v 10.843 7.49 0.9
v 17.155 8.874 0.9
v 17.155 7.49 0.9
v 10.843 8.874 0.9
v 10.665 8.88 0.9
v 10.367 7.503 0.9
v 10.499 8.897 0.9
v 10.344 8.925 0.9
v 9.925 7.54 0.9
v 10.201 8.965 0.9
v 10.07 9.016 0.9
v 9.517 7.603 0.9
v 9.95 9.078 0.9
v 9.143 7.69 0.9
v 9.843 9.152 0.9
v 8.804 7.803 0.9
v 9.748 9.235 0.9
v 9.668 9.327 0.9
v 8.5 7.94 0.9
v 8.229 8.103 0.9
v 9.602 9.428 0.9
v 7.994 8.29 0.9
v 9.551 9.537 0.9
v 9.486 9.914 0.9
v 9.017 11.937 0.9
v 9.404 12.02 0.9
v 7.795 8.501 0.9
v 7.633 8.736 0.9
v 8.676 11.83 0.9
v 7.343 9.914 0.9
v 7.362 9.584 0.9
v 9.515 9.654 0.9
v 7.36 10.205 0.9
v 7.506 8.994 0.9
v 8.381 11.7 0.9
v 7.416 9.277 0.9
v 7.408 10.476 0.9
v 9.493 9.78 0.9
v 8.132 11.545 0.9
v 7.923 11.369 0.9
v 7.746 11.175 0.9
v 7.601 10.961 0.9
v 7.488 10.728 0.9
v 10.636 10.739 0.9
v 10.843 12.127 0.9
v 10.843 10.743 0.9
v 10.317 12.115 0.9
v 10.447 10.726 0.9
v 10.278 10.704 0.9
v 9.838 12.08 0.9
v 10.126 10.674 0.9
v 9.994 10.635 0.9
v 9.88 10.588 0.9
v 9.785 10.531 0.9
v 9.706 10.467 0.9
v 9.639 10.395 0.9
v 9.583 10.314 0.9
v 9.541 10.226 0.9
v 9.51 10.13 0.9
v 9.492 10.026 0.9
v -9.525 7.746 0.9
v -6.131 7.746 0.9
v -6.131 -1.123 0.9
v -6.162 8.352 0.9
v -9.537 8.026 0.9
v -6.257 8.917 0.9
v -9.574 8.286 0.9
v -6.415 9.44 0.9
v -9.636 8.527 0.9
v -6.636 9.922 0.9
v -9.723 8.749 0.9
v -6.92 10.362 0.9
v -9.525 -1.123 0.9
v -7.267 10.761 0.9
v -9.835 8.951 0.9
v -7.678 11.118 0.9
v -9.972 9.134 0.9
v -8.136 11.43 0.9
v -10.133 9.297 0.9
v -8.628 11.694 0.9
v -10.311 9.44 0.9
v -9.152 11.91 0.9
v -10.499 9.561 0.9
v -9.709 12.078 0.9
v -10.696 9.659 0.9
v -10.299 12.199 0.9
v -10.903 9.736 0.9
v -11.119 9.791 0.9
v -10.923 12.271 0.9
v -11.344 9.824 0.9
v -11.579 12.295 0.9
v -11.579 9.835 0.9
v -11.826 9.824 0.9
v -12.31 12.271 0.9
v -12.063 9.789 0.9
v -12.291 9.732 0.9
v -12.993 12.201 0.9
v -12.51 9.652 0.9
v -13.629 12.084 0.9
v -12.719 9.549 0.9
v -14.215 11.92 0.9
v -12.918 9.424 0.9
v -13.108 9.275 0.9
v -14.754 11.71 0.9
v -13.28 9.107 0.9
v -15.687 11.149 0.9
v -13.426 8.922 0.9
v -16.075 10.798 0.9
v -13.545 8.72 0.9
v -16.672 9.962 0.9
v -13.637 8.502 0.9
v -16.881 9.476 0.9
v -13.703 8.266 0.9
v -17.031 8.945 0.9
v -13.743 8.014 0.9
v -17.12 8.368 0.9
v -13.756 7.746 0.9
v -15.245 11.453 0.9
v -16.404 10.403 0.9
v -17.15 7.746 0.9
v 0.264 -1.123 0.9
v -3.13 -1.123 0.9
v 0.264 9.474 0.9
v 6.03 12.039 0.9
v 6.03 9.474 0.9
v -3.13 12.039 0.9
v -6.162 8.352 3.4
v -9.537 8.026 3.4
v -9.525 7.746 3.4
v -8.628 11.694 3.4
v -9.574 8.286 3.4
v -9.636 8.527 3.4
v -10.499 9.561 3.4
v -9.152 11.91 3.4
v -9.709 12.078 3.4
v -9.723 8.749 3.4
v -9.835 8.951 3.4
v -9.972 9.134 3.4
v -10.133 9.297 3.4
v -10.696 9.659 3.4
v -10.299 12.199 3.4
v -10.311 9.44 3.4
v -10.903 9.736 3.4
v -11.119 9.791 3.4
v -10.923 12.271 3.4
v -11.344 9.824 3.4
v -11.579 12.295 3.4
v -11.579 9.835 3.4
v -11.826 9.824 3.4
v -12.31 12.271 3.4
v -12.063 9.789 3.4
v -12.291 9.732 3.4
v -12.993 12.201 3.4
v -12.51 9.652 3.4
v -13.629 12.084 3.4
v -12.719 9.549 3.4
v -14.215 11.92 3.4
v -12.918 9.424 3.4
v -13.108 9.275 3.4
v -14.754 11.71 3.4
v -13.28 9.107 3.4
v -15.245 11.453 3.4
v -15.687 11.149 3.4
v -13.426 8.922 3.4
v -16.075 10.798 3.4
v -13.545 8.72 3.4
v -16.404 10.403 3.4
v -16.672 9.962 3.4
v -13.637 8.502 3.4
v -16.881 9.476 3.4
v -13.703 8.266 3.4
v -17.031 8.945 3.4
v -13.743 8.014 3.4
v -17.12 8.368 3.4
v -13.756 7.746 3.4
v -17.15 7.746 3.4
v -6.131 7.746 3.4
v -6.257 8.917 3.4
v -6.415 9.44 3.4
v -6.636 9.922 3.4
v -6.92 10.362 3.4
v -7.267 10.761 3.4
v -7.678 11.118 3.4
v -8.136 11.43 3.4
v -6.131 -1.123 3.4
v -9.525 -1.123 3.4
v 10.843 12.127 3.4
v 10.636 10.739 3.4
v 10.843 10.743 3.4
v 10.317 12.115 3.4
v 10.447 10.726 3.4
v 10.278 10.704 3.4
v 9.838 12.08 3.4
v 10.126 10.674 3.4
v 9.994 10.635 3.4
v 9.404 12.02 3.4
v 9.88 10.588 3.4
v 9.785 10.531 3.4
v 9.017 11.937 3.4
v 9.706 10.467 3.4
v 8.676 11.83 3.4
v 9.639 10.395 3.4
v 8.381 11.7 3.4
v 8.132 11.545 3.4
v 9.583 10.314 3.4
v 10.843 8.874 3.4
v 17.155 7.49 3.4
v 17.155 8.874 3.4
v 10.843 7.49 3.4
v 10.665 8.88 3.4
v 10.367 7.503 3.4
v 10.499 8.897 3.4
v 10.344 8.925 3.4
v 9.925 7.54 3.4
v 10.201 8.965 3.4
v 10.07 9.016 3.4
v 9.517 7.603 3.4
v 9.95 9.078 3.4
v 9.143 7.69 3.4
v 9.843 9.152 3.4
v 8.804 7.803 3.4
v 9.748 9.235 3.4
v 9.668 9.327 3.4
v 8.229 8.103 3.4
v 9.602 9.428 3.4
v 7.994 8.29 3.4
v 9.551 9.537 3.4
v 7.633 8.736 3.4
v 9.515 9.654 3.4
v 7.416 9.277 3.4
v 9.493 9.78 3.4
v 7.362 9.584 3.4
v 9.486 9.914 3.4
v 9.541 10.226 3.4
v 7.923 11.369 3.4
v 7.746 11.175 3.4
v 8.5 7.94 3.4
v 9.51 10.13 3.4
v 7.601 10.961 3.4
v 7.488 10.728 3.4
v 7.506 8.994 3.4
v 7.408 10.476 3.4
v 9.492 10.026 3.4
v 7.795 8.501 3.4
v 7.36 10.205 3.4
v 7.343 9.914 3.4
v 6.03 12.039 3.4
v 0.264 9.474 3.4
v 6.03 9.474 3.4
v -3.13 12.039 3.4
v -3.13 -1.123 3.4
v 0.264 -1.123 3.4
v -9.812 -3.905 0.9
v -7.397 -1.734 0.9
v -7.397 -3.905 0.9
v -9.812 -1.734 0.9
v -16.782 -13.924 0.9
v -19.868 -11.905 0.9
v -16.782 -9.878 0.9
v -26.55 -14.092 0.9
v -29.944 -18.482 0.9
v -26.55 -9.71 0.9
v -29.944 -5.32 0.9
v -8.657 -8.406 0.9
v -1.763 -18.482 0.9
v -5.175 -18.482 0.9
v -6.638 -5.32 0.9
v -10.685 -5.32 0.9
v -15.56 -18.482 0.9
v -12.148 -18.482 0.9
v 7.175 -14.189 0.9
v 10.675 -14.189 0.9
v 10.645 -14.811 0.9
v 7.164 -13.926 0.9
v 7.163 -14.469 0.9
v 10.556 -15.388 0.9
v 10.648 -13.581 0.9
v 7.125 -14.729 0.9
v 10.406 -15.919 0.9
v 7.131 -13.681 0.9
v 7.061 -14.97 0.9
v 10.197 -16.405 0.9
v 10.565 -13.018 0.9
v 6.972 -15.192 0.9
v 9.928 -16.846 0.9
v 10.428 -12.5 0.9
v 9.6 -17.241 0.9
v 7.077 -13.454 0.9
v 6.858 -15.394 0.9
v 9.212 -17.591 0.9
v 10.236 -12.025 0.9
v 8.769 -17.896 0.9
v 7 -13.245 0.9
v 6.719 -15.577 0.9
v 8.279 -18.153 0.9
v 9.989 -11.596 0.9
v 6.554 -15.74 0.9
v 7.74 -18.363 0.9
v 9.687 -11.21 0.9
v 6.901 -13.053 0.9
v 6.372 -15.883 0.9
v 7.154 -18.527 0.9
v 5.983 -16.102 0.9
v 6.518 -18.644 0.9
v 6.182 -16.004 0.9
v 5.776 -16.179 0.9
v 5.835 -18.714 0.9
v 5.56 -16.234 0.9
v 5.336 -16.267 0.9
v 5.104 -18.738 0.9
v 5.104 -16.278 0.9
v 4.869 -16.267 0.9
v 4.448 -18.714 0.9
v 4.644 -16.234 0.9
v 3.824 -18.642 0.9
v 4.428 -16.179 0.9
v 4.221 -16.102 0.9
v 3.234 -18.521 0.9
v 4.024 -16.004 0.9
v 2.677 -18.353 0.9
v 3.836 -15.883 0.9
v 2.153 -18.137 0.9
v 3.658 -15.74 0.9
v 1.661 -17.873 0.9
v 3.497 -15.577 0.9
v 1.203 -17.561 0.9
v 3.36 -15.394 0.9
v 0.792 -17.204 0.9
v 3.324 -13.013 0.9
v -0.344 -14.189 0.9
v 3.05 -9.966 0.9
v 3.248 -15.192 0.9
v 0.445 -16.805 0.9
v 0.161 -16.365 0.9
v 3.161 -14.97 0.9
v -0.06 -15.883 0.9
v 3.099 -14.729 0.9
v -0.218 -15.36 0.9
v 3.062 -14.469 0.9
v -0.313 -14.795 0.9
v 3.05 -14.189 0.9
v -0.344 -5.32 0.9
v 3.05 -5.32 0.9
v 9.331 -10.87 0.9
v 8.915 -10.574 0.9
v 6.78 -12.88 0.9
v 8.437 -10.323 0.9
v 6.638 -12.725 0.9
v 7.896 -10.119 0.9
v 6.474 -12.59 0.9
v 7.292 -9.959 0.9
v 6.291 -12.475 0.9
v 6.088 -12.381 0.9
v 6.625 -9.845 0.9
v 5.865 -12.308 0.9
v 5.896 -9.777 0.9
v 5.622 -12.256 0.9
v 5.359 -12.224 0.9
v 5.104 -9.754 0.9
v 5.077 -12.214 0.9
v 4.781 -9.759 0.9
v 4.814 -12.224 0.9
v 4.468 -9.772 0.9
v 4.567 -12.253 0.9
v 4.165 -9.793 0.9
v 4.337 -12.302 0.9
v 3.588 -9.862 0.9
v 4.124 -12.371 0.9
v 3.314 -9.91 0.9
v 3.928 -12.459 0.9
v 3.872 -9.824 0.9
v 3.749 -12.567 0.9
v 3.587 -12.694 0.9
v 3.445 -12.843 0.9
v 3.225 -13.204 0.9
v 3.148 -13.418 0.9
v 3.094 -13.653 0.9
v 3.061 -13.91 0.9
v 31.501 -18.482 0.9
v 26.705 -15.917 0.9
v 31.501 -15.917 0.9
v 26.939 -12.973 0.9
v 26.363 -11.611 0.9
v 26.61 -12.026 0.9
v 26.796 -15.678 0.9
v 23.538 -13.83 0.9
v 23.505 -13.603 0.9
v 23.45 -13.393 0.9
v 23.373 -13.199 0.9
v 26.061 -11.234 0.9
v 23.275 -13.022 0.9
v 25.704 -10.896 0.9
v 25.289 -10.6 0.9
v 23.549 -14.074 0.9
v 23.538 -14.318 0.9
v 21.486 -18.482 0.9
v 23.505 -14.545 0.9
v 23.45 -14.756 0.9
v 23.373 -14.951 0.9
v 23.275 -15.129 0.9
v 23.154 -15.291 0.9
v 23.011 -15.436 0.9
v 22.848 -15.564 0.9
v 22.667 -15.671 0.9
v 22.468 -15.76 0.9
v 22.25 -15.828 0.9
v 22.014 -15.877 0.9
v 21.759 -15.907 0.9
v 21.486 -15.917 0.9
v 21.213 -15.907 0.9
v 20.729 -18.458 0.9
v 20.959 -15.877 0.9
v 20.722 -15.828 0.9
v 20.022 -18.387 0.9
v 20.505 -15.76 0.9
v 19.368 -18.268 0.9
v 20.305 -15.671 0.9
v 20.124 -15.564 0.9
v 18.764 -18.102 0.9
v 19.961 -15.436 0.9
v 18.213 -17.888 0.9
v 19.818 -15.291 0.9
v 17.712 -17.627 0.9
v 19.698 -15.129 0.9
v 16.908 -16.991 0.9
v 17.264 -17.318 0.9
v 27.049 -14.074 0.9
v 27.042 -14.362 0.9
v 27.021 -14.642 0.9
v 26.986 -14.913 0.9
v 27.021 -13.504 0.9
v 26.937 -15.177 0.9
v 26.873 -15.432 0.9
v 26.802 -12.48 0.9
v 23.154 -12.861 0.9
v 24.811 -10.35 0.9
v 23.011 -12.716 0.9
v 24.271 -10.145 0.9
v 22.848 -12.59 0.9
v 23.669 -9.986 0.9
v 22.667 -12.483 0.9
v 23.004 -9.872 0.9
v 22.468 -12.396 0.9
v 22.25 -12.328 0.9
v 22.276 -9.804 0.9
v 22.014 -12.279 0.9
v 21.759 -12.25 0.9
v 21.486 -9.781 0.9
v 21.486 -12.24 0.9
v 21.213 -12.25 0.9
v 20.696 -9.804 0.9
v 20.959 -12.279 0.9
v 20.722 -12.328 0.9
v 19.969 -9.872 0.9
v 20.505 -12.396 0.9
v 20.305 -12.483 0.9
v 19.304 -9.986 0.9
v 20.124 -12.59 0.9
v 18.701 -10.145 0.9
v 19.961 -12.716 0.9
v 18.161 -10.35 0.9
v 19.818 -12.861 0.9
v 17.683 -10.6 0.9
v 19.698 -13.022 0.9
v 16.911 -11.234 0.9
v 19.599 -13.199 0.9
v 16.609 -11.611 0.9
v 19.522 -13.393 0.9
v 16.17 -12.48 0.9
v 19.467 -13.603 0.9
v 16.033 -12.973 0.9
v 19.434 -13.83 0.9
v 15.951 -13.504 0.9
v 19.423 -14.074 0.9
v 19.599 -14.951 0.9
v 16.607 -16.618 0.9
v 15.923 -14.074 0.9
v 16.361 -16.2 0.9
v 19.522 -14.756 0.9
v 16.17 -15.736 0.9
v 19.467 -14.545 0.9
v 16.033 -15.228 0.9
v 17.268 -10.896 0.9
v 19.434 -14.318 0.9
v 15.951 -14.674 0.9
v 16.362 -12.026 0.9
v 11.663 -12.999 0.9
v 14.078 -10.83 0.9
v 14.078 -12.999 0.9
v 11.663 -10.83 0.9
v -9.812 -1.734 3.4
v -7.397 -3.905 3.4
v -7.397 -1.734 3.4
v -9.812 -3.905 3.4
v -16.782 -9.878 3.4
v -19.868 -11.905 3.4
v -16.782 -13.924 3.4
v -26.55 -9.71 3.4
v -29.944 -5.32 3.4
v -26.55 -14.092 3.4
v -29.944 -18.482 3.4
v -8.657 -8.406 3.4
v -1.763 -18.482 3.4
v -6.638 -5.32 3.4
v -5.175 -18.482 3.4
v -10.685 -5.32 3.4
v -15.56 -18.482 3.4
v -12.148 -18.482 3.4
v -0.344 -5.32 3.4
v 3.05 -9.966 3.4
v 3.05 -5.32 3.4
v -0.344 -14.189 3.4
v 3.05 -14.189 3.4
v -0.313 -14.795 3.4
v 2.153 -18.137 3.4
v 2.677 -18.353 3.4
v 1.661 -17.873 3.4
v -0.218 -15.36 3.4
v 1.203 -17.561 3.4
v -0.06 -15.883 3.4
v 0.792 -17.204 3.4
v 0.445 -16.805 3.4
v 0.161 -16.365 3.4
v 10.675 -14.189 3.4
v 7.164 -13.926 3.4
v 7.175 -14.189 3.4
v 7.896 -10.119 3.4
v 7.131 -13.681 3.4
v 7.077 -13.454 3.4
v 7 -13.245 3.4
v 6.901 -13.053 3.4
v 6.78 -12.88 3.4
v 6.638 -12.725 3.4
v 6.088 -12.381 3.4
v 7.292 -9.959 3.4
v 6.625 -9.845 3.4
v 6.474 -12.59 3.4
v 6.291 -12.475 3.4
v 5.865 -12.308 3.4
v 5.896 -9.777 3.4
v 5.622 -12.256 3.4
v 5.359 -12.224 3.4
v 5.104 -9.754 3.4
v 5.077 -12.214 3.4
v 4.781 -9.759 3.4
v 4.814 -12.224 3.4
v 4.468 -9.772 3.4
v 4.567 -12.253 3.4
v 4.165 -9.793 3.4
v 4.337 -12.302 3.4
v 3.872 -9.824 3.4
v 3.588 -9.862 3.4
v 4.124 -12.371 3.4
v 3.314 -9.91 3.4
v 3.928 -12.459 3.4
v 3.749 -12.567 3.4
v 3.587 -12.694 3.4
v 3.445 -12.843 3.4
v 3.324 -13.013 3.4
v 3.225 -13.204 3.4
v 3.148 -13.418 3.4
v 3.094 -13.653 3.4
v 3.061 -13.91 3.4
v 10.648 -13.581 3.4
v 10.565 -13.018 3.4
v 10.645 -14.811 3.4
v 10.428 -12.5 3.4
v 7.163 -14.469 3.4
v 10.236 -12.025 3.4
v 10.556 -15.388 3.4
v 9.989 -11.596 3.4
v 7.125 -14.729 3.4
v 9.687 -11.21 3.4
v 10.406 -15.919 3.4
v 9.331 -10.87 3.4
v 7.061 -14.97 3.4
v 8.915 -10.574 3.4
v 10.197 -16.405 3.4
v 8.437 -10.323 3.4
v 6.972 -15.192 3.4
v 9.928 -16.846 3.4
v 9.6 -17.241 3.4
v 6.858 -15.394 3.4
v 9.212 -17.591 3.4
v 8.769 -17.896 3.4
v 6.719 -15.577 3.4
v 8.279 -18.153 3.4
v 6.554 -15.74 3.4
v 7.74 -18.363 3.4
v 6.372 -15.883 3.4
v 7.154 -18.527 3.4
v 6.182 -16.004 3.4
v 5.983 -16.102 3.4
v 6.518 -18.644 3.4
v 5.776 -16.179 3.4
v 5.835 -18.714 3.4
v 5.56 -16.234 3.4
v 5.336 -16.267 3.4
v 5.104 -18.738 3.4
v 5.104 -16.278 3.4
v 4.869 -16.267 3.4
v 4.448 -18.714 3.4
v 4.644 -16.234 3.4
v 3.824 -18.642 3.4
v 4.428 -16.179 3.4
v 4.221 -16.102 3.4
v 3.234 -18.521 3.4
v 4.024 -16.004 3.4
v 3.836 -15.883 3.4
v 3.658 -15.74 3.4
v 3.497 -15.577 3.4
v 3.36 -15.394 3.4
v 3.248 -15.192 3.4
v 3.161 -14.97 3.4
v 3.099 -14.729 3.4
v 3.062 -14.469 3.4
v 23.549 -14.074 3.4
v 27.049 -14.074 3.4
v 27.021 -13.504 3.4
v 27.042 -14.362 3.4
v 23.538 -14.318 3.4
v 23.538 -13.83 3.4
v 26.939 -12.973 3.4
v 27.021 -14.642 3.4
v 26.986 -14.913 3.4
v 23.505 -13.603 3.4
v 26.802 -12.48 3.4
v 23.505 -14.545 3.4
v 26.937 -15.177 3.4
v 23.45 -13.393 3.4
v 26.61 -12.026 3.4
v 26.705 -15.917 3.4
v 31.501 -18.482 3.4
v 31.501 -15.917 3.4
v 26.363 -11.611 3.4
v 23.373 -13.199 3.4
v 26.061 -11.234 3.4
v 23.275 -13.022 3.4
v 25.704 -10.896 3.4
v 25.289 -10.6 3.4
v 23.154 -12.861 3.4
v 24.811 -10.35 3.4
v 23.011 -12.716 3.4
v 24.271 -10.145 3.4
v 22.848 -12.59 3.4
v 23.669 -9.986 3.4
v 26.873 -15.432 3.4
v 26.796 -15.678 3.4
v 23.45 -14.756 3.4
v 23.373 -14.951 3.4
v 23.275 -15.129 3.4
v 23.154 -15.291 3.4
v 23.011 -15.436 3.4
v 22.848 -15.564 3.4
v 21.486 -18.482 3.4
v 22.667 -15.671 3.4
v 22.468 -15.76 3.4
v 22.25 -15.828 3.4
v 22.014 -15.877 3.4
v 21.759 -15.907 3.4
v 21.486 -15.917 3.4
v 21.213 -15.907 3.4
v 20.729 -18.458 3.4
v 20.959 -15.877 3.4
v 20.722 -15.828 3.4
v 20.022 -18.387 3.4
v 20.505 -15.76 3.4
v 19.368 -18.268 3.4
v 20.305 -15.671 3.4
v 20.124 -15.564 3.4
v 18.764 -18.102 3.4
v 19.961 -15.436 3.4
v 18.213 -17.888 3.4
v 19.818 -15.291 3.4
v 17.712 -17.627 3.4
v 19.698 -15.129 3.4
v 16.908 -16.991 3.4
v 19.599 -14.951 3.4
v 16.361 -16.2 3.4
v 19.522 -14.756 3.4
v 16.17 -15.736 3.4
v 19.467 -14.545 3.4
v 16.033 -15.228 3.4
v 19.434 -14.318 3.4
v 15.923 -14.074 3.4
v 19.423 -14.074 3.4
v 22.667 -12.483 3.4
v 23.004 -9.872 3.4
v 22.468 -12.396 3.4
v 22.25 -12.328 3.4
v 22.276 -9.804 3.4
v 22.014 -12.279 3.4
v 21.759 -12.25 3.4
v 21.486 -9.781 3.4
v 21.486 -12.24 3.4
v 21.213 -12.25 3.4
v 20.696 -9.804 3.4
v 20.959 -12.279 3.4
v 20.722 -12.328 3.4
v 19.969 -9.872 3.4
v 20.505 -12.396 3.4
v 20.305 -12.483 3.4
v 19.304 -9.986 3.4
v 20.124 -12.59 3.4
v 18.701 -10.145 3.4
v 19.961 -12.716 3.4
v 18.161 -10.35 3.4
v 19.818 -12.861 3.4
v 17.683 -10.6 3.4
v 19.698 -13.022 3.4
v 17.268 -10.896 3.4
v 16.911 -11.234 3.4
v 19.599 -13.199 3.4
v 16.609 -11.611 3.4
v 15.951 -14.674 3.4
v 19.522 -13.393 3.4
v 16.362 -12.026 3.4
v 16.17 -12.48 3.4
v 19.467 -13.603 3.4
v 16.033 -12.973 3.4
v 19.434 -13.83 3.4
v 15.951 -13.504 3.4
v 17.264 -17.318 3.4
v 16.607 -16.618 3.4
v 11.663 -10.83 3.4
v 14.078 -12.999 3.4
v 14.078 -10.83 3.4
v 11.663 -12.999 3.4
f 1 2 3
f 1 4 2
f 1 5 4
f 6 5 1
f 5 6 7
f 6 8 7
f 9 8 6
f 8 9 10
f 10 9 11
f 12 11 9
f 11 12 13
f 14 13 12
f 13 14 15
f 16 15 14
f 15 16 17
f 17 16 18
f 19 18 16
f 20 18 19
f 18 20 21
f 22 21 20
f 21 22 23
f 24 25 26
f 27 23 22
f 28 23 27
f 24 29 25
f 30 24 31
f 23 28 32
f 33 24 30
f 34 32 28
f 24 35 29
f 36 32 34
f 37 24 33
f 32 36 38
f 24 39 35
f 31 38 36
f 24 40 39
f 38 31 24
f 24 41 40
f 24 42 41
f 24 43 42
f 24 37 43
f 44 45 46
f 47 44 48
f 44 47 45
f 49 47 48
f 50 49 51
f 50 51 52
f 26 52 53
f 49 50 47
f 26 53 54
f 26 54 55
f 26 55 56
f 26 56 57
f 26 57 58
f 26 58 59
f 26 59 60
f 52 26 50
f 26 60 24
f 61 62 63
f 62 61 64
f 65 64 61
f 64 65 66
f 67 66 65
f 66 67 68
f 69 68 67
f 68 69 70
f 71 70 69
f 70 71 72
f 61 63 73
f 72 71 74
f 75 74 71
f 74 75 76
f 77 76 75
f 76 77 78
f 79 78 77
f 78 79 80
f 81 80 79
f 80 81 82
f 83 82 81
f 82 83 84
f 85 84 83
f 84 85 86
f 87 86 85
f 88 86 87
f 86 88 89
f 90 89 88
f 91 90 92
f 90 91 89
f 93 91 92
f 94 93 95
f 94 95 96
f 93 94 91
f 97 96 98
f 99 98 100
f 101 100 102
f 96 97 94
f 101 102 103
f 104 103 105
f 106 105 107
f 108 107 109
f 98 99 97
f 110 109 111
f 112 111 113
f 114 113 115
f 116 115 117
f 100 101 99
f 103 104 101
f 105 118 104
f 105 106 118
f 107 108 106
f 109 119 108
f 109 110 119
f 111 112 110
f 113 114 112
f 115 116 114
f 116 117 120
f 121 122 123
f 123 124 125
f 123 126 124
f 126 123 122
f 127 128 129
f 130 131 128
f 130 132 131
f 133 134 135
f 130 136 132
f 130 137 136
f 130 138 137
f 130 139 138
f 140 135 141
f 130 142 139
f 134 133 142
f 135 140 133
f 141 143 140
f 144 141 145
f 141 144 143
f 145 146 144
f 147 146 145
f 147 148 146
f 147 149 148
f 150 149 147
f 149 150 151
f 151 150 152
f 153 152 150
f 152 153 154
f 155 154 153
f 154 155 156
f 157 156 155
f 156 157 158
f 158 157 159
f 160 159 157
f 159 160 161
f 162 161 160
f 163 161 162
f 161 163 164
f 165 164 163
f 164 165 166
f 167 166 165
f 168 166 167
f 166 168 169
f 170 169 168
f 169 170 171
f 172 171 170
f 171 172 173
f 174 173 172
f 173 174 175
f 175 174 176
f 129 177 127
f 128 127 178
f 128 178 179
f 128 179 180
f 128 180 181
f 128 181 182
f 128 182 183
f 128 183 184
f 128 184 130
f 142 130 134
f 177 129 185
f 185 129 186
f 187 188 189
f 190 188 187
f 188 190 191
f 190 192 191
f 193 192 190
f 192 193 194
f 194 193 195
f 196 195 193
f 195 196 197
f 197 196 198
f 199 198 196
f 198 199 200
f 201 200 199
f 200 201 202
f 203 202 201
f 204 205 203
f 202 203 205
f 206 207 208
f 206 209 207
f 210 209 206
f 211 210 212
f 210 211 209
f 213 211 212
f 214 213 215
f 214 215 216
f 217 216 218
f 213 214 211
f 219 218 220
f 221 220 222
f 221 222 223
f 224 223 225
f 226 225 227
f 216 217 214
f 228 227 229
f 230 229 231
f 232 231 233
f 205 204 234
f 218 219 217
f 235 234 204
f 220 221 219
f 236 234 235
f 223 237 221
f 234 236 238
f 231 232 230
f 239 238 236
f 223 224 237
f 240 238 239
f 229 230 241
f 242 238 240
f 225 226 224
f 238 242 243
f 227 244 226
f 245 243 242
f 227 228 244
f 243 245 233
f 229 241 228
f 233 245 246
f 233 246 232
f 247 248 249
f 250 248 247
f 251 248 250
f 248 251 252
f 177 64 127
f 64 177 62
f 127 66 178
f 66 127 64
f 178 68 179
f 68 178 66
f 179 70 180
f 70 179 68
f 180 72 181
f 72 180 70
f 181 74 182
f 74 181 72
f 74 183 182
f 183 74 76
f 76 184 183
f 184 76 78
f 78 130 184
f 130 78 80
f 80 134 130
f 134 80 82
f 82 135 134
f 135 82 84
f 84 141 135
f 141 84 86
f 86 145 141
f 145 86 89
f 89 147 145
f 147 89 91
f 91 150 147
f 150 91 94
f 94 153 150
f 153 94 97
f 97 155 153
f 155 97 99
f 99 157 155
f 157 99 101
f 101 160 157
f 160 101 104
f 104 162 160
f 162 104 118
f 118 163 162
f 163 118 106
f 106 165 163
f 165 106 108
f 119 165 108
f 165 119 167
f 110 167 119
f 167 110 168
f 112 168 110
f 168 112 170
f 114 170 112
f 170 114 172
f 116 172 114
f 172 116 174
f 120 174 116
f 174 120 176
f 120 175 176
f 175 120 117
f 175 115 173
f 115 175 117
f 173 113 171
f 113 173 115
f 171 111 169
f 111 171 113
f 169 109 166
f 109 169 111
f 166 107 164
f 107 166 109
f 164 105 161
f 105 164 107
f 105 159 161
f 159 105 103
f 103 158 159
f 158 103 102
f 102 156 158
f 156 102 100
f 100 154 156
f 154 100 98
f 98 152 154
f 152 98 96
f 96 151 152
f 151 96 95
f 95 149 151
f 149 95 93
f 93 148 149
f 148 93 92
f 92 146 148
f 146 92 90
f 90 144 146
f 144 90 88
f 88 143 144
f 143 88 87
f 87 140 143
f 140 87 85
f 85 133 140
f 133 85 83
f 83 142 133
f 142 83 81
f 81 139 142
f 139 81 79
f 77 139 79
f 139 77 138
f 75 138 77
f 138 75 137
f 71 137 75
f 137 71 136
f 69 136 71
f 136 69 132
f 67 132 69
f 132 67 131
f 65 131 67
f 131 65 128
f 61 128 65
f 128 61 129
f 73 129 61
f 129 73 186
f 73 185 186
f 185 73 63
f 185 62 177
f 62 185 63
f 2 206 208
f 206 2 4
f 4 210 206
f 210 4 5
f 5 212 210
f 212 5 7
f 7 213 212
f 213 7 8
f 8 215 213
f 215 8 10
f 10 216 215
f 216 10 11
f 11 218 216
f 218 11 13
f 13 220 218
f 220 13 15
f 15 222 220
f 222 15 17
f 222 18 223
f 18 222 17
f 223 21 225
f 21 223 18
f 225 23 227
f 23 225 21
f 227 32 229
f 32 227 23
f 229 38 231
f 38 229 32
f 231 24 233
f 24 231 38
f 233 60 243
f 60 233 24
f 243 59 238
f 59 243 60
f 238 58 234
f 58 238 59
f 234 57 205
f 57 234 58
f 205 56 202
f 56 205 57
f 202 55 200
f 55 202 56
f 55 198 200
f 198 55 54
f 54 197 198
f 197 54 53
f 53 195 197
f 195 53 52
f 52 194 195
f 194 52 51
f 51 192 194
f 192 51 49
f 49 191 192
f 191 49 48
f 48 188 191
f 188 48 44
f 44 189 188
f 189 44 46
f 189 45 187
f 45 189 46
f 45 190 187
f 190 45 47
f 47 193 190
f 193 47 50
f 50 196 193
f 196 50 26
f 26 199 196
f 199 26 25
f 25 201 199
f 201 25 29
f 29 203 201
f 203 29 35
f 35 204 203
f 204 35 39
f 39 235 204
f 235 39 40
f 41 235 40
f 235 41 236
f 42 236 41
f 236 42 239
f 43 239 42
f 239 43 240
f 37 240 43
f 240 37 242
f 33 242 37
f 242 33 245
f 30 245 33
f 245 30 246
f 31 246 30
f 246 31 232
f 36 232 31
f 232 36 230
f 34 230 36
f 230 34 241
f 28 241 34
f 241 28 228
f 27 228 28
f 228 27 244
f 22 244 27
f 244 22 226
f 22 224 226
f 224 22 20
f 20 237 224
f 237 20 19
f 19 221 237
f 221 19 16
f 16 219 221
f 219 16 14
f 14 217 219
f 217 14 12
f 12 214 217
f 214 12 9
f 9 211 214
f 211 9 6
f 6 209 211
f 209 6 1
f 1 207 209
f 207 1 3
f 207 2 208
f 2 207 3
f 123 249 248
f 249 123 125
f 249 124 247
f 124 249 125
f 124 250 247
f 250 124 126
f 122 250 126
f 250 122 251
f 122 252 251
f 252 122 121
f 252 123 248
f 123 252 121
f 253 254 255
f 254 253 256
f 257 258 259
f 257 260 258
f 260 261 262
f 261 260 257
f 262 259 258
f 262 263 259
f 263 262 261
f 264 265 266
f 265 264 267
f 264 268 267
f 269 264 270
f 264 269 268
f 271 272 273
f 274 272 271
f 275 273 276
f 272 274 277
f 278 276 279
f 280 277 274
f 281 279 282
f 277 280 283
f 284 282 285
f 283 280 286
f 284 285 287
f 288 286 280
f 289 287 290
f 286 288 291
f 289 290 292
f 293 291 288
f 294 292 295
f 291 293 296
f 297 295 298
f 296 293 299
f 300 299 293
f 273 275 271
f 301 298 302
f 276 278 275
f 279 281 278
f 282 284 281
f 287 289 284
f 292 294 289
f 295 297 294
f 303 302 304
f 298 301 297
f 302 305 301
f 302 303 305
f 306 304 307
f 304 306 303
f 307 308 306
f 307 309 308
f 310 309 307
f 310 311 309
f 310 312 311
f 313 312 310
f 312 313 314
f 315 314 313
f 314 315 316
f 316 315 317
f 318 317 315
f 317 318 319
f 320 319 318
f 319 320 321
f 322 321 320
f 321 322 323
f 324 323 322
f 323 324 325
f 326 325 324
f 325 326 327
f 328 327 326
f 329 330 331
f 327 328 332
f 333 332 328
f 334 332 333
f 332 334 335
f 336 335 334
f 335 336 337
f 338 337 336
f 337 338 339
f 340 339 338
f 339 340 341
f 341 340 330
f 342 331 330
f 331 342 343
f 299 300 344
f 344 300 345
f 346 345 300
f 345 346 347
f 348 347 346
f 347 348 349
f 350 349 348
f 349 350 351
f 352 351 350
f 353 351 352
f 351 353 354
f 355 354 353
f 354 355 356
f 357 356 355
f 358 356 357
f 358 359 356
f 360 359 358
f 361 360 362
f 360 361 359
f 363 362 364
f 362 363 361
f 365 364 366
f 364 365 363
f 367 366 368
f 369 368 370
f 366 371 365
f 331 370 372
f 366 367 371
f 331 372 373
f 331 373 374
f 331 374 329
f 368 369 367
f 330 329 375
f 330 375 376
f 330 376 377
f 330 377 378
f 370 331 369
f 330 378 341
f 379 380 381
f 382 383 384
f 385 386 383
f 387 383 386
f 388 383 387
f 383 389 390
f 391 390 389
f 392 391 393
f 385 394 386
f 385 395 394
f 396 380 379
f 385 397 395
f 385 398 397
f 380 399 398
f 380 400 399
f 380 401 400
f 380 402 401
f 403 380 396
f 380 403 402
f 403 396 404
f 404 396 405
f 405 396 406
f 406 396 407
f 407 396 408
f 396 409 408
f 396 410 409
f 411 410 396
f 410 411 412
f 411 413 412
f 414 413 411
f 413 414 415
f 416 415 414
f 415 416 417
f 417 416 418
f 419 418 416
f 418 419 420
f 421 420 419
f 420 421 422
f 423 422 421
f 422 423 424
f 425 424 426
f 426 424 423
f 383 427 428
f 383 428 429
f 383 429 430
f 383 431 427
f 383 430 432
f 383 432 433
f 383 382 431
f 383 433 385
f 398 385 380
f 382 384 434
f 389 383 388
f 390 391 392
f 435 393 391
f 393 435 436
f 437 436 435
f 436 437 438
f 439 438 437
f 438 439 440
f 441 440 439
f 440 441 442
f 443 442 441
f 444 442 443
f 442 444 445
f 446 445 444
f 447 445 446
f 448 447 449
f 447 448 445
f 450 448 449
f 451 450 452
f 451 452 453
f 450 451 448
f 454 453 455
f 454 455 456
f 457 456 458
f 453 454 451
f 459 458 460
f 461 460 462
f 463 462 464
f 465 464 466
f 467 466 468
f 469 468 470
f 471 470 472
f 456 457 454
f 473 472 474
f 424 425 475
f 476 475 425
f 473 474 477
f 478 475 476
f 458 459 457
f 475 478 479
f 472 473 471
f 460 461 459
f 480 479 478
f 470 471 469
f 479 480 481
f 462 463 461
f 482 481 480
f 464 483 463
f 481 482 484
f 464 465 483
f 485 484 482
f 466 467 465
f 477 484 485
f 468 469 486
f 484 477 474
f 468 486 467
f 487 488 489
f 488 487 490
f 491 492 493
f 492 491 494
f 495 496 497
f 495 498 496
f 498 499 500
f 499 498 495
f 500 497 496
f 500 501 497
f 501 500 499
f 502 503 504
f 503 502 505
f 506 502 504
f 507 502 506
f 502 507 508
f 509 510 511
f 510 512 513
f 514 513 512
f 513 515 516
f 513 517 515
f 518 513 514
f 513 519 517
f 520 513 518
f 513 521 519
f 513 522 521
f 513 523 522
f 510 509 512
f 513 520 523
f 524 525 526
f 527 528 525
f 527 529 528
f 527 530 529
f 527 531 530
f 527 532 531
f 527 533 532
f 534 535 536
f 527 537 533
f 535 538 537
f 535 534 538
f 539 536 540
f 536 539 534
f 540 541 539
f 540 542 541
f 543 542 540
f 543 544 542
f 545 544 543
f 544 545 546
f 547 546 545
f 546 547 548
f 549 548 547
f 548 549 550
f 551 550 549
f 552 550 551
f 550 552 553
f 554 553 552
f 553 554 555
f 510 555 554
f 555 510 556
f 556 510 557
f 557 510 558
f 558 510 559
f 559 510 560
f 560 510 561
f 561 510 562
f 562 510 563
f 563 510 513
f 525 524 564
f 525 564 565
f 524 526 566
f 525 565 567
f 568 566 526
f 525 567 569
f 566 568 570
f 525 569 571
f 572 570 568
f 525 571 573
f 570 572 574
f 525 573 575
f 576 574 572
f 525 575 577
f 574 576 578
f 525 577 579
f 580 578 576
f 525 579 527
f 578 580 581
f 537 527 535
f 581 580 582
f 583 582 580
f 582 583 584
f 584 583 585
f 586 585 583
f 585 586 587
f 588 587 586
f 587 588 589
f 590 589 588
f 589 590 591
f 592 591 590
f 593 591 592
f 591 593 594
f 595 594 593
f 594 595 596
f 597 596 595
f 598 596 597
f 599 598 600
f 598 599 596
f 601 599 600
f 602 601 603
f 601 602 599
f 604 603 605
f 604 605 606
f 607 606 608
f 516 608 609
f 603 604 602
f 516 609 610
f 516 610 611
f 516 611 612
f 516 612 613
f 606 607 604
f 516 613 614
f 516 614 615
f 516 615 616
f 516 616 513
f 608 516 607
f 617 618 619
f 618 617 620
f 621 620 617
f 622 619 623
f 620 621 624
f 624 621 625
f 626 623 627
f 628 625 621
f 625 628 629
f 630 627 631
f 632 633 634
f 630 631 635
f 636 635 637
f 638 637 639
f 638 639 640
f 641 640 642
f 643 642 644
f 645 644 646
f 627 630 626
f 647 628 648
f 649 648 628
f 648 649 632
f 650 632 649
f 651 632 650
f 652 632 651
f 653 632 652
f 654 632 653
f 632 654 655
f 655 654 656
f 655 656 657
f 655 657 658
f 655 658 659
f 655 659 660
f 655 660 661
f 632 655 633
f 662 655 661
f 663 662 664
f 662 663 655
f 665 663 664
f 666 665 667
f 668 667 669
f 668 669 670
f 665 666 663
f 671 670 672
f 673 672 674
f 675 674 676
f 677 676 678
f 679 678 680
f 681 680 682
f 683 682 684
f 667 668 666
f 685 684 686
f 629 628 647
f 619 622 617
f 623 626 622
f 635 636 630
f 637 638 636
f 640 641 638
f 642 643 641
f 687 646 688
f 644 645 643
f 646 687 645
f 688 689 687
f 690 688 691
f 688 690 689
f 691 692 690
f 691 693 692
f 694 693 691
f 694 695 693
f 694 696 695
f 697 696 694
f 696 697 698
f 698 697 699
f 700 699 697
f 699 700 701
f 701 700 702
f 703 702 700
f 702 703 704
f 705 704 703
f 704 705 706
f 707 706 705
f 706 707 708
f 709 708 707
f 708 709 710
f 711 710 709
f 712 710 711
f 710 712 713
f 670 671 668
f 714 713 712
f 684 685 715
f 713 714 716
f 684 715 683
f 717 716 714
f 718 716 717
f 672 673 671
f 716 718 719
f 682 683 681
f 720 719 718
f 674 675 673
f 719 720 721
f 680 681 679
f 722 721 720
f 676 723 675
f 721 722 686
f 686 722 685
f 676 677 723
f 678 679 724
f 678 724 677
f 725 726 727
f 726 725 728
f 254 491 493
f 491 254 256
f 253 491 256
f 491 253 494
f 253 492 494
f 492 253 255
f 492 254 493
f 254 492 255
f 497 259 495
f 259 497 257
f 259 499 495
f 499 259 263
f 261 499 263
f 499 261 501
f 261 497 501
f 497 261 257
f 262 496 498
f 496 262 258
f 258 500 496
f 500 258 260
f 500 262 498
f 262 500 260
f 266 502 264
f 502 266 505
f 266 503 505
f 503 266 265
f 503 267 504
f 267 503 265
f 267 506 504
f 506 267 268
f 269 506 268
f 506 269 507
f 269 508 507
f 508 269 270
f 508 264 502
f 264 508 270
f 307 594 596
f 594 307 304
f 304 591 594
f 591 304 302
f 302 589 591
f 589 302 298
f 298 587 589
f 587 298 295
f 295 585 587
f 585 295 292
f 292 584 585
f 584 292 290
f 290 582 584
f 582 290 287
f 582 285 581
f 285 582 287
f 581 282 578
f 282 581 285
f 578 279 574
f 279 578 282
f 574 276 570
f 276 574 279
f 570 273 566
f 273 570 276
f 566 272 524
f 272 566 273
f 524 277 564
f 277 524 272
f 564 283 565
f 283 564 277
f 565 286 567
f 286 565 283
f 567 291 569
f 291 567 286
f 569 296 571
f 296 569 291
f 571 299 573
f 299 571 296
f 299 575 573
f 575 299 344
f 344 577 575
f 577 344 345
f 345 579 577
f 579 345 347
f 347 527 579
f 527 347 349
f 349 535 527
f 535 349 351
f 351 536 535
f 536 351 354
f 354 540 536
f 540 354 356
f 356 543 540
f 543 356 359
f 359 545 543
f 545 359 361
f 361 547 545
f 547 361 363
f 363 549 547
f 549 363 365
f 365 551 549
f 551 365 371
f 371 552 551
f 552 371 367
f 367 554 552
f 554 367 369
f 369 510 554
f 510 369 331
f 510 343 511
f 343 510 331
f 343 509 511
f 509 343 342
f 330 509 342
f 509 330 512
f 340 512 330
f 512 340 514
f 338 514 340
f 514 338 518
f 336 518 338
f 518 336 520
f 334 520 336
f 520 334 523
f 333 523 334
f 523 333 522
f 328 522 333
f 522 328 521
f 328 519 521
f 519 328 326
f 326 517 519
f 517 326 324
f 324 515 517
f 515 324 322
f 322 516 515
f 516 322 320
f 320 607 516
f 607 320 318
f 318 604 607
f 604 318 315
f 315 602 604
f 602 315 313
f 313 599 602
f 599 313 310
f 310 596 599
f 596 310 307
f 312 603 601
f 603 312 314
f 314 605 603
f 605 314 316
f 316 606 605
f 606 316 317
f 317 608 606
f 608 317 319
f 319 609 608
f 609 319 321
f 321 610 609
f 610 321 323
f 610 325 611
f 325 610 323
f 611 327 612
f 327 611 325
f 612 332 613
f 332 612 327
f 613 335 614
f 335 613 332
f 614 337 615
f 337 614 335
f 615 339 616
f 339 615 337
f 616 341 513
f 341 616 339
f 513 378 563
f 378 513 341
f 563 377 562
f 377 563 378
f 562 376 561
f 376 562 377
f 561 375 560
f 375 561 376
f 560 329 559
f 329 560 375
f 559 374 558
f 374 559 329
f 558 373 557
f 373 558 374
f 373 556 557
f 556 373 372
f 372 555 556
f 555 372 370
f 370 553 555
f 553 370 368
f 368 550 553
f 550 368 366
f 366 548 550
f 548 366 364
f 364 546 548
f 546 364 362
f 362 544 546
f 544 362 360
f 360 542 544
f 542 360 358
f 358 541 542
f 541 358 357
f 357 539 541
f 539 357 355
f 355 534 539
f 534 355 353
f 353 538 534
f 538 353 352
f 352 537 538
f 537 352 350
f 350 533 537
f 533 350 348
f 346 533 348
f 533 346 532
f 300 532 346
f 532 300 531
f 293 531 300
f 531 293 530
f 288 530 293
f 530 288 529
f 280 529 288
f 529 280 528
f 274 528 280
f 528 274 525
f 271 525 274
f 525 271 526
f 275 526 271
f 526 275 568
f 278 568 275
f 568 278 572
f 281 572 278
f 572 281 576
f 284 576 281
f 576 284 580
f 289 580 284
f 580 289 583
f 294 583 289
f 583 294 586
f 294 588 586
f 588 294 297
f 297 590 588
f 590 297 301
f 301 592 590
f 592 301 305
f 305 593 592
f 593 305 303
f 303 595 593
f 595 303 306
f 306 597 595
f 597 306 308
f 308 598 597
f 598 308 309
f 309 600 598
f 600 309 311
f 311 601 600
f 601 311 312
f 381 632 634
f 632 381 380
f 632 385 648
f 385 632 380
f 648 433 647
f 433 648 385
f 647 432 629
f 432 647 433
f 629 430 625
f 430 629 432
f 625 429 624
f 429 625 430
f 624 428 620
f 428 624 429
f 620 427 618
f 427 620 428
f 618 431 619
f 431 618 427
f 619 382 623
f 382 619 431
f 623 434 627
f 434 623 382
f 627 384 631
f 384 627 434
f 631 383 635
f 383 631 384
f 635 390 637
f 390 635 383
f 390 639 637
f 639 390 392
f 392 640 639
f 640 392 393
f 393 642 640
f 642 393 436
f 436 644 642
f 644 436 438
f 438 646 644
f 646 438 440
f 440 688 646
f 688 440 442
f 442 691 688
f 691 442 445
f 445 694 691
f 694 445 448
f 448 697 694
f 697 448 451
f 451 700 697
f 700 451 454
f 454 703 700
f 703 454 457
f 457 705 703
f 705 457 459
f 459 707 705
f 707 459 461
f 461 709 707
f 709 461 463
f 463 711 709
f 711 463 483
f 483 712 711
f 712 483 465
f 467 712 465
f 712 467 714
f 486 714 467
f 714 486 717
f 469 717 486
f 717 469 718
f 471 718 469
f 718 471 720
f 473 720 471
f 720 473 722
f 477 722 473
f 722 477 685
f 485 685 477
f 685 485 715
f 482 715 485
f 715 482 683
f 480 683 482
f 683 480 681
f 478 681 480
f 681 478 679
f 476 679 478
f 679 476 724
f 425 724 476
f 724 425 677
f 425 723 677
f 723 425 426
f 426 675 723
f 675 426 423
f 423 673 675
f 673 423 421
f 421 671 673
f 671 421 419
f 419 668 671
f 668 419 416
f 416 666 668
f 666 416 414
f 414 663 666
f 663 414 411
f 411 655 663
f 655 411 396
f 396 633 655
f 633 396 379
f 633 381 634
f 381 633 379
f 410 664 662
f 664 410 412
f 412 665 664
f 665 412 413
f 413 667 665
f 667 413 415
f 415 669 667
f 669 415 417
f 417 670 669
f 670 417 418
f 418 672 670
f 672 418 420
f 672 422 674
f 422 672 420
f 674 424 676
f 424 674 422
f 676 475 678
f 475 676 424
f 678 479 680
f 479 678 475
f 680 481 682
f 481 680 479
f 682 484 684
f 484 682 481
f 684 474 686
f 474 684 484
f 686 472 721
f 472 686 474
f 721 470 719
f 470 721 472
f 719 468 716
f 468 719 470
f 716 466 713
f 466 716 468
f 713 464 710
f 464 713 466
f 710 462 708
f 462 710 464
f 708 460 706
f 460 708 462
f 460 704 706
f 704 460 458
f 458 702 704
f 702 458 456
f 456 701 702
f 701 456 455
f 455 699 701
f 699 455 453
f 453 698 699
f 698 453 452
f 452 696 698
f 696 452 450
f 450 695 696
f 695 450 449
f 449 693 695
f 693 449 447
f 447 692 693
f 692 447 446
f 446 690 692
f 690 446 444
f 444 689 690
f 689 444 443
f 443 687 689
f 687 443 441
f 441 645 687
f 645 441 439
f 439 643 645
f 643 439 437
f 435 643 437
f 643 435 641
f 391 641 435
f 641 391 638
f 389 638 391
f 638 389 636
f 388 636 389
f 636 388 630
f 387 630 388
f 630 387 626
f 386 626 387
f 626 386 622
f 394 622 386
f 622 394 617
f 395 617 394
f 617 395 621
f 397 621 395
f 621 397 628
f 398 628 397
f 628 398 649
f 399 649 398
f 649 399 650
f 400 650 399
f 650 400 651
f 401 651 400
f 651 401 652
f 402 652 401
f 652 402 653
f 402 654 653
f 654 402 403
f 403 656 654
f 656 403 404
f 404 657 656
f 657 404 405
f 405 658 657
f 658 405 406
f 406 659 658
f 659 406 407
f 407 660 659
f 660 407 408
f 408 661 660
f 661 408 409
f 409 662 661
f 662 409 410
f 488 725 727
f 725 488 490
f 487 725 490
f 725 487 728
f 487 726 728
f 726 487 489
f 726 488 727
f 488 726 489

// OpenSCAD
$fn = 48;
  // syllabics (overlaid on icon, tallest)
  translate([0, 5.430, 0.900]) linear_extrude(height=2.500) text("ᒉᒥᓪ", size=13.000, halign="center", valign="center", font="Euphemia UCAS:style=Bold");
  translate([0, -10.430, 0.900]) linear_extrude(height=2.500) text("ᐅᐲᑿᓇ", size=13.000, halign="center", valign="center", font="Euphemia UCAS:style=Bold");
